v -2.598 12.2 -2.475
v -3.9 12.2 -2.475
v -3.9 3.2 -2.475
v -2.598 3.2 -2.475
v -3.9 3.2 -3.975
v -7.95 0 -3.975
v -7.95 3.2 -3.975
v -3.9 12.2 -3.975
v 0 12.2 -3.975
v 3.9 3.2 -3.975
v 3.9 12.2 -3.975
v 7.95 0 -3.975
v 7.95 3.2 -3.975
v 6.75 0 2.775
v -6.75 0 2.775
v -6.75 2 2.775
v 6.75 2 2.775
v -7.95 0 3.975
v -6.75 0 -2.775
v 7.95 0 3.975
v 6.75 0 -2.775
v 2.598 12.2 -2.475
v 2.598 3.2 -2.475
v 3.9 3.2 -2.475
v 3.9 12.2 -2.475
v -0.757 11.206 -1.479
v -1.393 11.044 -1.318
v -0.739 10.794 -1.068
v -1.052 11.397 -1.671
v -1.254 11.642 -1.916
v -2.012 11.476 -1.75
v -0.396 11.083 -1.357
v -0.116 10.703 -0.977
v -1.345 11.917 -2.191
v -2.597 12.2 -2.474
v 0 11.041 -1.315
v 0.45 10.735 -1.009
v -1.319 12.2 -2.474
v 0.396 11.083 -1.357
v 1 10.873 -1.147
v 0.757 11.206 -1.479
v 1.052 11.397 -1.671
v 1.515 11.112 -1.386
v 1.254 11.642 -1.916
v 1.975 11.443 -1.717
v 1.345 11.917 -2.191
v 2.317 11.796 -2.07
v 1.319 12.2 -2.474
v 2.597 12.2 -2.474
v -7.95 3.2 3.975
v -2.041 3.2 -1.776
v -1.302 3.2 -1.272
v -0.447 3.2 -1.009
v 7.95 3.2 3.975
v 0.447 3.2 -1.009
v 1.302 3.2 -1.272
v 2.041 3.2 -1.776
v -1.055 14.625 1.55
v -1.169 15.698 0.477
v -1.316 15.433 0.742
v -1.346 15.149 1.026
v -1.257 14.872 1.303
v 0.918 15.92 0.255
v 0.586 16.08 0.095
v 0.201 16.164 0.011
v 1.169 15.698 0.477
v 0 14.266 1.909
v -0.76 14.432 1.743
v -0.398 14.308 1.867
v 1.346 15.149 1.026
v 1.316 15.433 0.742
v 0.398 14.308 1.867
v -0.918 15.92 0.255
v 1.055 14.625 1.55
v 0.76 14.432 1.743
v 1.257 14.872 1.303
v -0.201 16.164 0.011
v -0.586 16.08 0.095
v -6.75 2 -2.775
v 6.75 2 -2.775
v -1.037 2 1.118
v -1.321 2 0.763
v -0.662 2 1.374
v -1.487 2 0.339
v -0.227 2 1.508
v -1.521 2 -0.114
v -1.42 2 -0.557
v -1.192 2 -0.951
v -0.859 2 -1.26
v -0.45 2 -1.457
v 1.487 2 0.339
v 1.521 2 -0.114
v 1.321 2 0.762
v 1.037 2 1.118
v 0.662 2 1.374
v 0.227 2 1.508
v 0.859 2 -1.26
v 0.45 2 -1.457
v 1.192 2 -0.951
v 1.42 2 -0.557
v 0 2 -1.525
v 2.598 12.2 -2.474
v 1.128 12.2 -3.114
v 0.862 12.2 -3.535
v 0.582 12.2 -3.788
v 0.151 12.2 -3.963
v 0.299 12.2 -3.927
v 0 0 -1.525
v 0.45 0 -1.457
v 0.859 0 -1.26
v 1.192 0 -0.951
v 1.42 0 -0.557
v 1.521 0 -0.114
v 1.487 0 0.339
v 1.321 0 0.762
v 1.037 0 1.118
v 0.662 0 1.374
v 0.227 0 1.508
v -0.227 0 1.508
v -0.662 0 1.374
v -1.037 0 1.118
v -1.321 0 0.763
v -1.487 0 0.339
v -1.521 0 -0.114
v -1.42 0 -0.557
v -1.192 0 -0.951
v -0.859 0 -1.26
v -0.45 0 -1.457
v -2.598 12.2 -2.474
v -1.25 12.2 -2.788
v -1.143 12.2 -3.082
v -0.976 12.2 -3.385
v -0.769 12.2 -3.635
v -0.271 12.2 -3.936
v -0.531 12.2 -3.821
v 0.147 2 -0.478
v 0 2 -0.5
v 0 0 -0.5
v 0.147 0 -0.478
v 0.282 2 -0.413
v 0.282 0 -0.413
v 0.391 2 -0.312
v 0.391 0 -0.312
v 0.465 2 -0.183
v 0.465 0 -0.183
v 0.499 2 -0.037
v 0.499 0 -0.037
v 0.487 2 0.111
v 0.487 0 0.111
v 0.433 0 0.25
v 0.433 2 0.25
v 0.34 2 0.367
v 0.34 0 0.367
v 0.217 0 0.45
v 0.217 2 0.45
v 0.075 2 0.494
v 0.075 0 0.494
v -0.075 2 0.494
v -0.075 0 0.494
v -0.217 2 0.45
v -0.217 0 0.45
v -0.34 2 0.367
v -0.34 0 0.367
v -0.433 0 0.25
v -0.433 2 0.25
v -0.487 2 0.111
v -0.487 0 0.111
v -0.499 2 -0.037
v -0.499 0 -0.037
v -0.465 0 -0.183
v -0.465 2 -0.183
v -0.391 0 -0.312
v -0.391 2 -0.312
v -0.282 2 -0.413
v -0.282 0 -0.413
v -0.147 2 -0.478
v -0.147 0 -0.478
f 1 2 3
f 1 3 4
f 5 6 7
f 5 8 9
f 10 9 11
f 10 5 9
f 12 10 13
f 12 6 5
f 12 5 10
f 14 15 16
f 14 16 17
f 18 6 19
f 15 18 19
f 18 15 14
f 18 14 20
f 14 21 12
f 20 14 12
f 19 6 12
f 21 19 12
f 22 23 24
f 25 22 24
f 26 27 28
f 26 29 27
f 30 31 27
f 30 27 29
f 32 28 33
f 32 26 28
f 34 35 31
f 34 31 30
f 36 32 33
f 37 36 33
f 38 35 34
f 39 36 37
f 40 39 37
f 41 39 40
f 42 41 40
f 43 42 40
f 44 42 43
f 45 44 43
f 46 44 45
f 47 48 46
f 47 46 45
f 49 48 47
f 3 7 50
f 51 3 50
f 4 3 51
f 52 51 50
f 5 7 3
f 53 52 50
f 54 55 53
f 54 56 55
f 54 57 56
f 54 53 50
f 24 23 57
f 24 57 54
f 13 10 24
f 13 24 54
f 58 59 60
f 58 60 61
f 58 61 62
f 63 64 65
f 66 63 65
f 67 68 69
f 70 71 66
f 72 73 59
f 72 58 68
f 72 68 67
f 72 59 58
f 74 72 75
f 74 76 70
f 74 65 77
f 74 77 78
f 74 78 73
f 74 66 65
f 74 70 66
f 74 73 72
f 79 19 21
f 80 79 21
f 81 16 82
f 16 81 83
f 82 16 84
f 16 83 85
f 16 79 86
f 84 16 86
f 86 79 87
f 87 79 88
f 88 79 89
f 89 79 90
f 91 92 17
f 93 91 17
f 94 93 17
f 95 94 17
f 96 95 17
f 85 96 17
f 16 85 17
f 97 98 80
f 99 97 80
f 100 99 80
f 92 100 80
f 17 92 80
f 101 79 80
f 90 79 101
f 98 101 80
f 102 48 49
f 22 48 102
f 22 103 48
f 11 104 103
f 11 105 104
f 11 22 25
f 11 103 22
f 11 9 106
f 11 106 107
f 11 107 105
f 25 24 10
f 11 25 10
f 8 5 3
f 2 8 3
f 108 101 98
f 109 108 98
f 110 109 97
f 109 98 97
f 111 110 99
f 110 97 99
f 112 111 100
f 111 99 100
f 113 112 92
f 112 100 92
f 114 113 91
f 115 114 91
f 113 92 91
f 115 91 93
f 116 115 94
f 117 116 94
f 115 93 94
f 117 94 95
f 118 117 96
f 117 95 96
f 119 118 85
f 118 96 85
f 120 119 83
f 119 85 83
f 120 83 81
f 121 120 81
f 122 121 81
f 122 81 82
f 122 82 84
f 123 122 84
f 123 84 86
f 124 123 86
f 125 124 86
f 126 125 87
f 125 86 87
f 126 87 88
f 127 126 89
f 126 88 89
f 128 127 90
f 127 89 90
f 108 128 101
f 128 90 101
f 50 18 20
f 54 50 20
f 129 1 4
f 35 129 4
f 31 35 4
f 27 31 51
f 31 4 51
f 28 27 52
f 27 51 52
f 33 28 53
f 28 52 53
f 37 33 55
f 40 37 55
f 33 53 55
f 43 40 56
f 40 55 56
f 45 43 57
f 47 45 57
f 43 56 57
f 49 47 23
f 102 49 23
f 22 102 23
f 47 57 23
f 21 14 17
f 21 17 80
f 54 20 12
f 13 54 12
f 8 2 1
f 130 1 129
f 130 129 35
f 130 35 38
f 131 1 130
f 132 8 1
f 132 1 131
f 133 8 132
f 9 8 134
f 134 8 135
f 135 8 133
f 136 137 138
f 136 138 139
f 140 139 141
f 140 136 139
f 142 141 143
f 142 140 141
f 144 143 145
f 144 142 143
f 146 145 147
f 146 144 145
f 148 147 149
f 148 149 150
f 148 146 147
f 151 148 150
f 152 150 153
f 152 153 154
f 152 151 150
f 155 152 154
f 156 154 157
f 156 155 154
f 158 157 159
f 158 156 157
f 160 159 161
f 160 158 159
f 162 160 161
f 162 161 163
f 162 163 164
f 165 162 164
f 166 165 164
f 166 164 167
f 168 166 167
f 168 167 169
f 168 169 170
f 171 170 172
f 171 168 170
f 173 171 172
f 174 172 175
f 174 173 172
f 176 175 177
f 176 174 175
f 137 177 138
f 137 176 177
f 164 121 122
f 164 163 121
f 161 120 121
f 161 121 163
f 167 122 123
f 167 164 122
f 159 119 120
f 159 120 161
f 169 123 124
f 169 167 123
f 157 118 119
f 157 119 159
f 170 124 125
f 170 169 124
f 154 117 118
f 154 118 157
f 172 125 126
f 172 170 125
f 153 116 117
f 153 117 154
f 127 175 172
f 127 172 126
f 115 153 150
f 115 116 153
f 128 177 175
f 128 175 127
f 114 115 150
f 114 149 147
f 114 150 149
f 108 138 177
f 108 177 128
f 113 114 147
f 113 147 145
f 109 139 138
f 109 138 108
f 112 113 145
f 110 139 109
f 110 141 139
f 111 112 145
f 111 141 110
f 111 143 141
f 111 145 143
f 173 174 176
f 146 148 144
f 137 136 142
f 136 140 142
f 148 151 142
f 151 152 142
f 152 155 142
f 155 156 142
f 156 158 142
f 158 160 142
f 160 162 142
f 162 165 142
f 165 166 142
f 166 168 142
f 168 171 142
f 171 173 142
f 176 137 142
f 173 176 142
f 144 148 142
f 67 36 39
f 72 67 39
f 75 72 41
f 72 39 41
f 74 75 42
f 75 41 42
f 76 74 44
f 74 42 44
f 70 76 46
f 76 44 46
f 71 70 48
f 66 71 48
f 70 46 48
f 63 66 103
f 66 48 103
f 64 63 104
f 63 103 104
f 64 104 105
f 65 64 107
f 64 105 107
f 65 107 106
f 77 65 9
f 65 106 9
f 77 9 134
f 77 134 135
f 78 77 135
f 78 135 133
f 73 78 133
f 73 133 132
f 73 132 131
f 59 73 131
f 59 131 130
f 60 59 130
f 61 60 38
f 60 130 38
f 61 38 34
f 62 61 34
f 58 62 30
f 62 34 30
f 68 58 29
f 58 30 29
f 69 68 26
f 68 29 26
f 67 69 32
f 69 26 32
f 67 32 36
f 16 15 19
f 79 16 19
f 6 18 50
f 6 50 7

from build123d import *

# Parameters (mm, degrees)
SKETCH1_W           = 15.9
SKETCH1_H           = 7.95
BOSS_EXTRUDE1_DEPTH = 3.2
SHELL1_T            = -1.2
SKETCH3_R           = 1.525
SKETCH3_R_2         = 0.5
BOSS_EXTRUDE3_DEPTH = 2
BOSS_EXTRUDE4_DEPTH = 9
SKETCH7_W           = 30
SKETCH7_H           = 30
CUT_EXTRUDE1_DEPTH  = 14.969416324
BOSS_EXTRUDE5_START = -5.621499
SKETCH8_R           = 1.35
BOSS_EXTRUDE5_DEPTH = 5.621499


with BuildPart() as part:
    # Sketch1 → Boss-Extrude1 (new body)
    with BuildSketch(Plane(origin=(0, 0, 0), x_dir=(1, 0, 0), z_dir=(0, 1, 0))):
        Rectangle(SKETCH1_W, SKETCH1_H)
    extrude(amount=BOSS_EXTRUDE1_DEPTH)

    # Shell1
    shell1_openings = [part.faces().sort_by_distance(p)[0] for p in [
        (0, 0, 0),
    ]]
    offset(amount=SHELL1_T, openings=shell1_openings, kind=Kind.INTERSECTION)

    # Sketch3 → Boss-Extrude3 (add)
    with BuildSketch(Plane.XZ.offset(-2)):
        with Locations(Location((0, 0, 0), (0, 0, 270))):
            Circle(SKETCH3_R)
        with Locations(Location((0, 0, 0), (0, 0, 270))):
            Circle(SKETCH3_R_2, mode=Mode.SUBTRACT)
    extrude(amount=BOSS_EXTRUDE3_DEPTH)

    # Sketch4 → Boss-Extrude4 (add)
    with BuildSketch(Plane(origin=(0, 3.2, 0), x_dir=(1, 0, 0), z_dir=(0, 1, 0))):
        with BuildLine():
            Line((-3.9, 3.975), (-3.9, 2.475))
            Line((-3.9, 2.475), (-2.598076211, 2.475))
            ThreePointArc((-2.598076211, 2.475), (0, 0.975), (2.598076211, 2.475))
            Line((2.598076211, 2.475), (3.9, 2.475))
            Line((3.9, 2.475), (3.9, 3.975))
            Line((3.9, 3.975), (-3.9, 3.975))
        make_face()
    extrude(amount=BOSS_EXTRUDE4_DEPTH)

    # Sketch7 → Cut-Extrude1 (cut, through all)
    with BuildSketch(Plane(origin=(0, 4.863093078, 4.863093078), x_dir=(1, 0, 0), z_dir=(0, 0.7071067811865475, 0.7071067811865477))):
        Rectangle(SKETCH7_W, SKETCH7_H)
    extrude(amount=CUT_EXTRUDE1_DEPTH, mode=Mode.SUBTRACT)

    # Sketch8 → Boss-Extrude5 (add)
    with BuildSketch(Plane(origin=(0, 8.0875, 8.0875), x_dir=(1, 0, 0), z_dir=(0, 0.7071067811865475, 0.7071067811865477)).offset(BOSS_EXTRUDE5_START)):
        with Locations(Location((0, 10.087452186, 0), (0, 0, 270))):
            Circle(SKETCH8_R)
    extrude(amount=BOSS_EXTRUDE5_DEPTH)


solid = part.part
